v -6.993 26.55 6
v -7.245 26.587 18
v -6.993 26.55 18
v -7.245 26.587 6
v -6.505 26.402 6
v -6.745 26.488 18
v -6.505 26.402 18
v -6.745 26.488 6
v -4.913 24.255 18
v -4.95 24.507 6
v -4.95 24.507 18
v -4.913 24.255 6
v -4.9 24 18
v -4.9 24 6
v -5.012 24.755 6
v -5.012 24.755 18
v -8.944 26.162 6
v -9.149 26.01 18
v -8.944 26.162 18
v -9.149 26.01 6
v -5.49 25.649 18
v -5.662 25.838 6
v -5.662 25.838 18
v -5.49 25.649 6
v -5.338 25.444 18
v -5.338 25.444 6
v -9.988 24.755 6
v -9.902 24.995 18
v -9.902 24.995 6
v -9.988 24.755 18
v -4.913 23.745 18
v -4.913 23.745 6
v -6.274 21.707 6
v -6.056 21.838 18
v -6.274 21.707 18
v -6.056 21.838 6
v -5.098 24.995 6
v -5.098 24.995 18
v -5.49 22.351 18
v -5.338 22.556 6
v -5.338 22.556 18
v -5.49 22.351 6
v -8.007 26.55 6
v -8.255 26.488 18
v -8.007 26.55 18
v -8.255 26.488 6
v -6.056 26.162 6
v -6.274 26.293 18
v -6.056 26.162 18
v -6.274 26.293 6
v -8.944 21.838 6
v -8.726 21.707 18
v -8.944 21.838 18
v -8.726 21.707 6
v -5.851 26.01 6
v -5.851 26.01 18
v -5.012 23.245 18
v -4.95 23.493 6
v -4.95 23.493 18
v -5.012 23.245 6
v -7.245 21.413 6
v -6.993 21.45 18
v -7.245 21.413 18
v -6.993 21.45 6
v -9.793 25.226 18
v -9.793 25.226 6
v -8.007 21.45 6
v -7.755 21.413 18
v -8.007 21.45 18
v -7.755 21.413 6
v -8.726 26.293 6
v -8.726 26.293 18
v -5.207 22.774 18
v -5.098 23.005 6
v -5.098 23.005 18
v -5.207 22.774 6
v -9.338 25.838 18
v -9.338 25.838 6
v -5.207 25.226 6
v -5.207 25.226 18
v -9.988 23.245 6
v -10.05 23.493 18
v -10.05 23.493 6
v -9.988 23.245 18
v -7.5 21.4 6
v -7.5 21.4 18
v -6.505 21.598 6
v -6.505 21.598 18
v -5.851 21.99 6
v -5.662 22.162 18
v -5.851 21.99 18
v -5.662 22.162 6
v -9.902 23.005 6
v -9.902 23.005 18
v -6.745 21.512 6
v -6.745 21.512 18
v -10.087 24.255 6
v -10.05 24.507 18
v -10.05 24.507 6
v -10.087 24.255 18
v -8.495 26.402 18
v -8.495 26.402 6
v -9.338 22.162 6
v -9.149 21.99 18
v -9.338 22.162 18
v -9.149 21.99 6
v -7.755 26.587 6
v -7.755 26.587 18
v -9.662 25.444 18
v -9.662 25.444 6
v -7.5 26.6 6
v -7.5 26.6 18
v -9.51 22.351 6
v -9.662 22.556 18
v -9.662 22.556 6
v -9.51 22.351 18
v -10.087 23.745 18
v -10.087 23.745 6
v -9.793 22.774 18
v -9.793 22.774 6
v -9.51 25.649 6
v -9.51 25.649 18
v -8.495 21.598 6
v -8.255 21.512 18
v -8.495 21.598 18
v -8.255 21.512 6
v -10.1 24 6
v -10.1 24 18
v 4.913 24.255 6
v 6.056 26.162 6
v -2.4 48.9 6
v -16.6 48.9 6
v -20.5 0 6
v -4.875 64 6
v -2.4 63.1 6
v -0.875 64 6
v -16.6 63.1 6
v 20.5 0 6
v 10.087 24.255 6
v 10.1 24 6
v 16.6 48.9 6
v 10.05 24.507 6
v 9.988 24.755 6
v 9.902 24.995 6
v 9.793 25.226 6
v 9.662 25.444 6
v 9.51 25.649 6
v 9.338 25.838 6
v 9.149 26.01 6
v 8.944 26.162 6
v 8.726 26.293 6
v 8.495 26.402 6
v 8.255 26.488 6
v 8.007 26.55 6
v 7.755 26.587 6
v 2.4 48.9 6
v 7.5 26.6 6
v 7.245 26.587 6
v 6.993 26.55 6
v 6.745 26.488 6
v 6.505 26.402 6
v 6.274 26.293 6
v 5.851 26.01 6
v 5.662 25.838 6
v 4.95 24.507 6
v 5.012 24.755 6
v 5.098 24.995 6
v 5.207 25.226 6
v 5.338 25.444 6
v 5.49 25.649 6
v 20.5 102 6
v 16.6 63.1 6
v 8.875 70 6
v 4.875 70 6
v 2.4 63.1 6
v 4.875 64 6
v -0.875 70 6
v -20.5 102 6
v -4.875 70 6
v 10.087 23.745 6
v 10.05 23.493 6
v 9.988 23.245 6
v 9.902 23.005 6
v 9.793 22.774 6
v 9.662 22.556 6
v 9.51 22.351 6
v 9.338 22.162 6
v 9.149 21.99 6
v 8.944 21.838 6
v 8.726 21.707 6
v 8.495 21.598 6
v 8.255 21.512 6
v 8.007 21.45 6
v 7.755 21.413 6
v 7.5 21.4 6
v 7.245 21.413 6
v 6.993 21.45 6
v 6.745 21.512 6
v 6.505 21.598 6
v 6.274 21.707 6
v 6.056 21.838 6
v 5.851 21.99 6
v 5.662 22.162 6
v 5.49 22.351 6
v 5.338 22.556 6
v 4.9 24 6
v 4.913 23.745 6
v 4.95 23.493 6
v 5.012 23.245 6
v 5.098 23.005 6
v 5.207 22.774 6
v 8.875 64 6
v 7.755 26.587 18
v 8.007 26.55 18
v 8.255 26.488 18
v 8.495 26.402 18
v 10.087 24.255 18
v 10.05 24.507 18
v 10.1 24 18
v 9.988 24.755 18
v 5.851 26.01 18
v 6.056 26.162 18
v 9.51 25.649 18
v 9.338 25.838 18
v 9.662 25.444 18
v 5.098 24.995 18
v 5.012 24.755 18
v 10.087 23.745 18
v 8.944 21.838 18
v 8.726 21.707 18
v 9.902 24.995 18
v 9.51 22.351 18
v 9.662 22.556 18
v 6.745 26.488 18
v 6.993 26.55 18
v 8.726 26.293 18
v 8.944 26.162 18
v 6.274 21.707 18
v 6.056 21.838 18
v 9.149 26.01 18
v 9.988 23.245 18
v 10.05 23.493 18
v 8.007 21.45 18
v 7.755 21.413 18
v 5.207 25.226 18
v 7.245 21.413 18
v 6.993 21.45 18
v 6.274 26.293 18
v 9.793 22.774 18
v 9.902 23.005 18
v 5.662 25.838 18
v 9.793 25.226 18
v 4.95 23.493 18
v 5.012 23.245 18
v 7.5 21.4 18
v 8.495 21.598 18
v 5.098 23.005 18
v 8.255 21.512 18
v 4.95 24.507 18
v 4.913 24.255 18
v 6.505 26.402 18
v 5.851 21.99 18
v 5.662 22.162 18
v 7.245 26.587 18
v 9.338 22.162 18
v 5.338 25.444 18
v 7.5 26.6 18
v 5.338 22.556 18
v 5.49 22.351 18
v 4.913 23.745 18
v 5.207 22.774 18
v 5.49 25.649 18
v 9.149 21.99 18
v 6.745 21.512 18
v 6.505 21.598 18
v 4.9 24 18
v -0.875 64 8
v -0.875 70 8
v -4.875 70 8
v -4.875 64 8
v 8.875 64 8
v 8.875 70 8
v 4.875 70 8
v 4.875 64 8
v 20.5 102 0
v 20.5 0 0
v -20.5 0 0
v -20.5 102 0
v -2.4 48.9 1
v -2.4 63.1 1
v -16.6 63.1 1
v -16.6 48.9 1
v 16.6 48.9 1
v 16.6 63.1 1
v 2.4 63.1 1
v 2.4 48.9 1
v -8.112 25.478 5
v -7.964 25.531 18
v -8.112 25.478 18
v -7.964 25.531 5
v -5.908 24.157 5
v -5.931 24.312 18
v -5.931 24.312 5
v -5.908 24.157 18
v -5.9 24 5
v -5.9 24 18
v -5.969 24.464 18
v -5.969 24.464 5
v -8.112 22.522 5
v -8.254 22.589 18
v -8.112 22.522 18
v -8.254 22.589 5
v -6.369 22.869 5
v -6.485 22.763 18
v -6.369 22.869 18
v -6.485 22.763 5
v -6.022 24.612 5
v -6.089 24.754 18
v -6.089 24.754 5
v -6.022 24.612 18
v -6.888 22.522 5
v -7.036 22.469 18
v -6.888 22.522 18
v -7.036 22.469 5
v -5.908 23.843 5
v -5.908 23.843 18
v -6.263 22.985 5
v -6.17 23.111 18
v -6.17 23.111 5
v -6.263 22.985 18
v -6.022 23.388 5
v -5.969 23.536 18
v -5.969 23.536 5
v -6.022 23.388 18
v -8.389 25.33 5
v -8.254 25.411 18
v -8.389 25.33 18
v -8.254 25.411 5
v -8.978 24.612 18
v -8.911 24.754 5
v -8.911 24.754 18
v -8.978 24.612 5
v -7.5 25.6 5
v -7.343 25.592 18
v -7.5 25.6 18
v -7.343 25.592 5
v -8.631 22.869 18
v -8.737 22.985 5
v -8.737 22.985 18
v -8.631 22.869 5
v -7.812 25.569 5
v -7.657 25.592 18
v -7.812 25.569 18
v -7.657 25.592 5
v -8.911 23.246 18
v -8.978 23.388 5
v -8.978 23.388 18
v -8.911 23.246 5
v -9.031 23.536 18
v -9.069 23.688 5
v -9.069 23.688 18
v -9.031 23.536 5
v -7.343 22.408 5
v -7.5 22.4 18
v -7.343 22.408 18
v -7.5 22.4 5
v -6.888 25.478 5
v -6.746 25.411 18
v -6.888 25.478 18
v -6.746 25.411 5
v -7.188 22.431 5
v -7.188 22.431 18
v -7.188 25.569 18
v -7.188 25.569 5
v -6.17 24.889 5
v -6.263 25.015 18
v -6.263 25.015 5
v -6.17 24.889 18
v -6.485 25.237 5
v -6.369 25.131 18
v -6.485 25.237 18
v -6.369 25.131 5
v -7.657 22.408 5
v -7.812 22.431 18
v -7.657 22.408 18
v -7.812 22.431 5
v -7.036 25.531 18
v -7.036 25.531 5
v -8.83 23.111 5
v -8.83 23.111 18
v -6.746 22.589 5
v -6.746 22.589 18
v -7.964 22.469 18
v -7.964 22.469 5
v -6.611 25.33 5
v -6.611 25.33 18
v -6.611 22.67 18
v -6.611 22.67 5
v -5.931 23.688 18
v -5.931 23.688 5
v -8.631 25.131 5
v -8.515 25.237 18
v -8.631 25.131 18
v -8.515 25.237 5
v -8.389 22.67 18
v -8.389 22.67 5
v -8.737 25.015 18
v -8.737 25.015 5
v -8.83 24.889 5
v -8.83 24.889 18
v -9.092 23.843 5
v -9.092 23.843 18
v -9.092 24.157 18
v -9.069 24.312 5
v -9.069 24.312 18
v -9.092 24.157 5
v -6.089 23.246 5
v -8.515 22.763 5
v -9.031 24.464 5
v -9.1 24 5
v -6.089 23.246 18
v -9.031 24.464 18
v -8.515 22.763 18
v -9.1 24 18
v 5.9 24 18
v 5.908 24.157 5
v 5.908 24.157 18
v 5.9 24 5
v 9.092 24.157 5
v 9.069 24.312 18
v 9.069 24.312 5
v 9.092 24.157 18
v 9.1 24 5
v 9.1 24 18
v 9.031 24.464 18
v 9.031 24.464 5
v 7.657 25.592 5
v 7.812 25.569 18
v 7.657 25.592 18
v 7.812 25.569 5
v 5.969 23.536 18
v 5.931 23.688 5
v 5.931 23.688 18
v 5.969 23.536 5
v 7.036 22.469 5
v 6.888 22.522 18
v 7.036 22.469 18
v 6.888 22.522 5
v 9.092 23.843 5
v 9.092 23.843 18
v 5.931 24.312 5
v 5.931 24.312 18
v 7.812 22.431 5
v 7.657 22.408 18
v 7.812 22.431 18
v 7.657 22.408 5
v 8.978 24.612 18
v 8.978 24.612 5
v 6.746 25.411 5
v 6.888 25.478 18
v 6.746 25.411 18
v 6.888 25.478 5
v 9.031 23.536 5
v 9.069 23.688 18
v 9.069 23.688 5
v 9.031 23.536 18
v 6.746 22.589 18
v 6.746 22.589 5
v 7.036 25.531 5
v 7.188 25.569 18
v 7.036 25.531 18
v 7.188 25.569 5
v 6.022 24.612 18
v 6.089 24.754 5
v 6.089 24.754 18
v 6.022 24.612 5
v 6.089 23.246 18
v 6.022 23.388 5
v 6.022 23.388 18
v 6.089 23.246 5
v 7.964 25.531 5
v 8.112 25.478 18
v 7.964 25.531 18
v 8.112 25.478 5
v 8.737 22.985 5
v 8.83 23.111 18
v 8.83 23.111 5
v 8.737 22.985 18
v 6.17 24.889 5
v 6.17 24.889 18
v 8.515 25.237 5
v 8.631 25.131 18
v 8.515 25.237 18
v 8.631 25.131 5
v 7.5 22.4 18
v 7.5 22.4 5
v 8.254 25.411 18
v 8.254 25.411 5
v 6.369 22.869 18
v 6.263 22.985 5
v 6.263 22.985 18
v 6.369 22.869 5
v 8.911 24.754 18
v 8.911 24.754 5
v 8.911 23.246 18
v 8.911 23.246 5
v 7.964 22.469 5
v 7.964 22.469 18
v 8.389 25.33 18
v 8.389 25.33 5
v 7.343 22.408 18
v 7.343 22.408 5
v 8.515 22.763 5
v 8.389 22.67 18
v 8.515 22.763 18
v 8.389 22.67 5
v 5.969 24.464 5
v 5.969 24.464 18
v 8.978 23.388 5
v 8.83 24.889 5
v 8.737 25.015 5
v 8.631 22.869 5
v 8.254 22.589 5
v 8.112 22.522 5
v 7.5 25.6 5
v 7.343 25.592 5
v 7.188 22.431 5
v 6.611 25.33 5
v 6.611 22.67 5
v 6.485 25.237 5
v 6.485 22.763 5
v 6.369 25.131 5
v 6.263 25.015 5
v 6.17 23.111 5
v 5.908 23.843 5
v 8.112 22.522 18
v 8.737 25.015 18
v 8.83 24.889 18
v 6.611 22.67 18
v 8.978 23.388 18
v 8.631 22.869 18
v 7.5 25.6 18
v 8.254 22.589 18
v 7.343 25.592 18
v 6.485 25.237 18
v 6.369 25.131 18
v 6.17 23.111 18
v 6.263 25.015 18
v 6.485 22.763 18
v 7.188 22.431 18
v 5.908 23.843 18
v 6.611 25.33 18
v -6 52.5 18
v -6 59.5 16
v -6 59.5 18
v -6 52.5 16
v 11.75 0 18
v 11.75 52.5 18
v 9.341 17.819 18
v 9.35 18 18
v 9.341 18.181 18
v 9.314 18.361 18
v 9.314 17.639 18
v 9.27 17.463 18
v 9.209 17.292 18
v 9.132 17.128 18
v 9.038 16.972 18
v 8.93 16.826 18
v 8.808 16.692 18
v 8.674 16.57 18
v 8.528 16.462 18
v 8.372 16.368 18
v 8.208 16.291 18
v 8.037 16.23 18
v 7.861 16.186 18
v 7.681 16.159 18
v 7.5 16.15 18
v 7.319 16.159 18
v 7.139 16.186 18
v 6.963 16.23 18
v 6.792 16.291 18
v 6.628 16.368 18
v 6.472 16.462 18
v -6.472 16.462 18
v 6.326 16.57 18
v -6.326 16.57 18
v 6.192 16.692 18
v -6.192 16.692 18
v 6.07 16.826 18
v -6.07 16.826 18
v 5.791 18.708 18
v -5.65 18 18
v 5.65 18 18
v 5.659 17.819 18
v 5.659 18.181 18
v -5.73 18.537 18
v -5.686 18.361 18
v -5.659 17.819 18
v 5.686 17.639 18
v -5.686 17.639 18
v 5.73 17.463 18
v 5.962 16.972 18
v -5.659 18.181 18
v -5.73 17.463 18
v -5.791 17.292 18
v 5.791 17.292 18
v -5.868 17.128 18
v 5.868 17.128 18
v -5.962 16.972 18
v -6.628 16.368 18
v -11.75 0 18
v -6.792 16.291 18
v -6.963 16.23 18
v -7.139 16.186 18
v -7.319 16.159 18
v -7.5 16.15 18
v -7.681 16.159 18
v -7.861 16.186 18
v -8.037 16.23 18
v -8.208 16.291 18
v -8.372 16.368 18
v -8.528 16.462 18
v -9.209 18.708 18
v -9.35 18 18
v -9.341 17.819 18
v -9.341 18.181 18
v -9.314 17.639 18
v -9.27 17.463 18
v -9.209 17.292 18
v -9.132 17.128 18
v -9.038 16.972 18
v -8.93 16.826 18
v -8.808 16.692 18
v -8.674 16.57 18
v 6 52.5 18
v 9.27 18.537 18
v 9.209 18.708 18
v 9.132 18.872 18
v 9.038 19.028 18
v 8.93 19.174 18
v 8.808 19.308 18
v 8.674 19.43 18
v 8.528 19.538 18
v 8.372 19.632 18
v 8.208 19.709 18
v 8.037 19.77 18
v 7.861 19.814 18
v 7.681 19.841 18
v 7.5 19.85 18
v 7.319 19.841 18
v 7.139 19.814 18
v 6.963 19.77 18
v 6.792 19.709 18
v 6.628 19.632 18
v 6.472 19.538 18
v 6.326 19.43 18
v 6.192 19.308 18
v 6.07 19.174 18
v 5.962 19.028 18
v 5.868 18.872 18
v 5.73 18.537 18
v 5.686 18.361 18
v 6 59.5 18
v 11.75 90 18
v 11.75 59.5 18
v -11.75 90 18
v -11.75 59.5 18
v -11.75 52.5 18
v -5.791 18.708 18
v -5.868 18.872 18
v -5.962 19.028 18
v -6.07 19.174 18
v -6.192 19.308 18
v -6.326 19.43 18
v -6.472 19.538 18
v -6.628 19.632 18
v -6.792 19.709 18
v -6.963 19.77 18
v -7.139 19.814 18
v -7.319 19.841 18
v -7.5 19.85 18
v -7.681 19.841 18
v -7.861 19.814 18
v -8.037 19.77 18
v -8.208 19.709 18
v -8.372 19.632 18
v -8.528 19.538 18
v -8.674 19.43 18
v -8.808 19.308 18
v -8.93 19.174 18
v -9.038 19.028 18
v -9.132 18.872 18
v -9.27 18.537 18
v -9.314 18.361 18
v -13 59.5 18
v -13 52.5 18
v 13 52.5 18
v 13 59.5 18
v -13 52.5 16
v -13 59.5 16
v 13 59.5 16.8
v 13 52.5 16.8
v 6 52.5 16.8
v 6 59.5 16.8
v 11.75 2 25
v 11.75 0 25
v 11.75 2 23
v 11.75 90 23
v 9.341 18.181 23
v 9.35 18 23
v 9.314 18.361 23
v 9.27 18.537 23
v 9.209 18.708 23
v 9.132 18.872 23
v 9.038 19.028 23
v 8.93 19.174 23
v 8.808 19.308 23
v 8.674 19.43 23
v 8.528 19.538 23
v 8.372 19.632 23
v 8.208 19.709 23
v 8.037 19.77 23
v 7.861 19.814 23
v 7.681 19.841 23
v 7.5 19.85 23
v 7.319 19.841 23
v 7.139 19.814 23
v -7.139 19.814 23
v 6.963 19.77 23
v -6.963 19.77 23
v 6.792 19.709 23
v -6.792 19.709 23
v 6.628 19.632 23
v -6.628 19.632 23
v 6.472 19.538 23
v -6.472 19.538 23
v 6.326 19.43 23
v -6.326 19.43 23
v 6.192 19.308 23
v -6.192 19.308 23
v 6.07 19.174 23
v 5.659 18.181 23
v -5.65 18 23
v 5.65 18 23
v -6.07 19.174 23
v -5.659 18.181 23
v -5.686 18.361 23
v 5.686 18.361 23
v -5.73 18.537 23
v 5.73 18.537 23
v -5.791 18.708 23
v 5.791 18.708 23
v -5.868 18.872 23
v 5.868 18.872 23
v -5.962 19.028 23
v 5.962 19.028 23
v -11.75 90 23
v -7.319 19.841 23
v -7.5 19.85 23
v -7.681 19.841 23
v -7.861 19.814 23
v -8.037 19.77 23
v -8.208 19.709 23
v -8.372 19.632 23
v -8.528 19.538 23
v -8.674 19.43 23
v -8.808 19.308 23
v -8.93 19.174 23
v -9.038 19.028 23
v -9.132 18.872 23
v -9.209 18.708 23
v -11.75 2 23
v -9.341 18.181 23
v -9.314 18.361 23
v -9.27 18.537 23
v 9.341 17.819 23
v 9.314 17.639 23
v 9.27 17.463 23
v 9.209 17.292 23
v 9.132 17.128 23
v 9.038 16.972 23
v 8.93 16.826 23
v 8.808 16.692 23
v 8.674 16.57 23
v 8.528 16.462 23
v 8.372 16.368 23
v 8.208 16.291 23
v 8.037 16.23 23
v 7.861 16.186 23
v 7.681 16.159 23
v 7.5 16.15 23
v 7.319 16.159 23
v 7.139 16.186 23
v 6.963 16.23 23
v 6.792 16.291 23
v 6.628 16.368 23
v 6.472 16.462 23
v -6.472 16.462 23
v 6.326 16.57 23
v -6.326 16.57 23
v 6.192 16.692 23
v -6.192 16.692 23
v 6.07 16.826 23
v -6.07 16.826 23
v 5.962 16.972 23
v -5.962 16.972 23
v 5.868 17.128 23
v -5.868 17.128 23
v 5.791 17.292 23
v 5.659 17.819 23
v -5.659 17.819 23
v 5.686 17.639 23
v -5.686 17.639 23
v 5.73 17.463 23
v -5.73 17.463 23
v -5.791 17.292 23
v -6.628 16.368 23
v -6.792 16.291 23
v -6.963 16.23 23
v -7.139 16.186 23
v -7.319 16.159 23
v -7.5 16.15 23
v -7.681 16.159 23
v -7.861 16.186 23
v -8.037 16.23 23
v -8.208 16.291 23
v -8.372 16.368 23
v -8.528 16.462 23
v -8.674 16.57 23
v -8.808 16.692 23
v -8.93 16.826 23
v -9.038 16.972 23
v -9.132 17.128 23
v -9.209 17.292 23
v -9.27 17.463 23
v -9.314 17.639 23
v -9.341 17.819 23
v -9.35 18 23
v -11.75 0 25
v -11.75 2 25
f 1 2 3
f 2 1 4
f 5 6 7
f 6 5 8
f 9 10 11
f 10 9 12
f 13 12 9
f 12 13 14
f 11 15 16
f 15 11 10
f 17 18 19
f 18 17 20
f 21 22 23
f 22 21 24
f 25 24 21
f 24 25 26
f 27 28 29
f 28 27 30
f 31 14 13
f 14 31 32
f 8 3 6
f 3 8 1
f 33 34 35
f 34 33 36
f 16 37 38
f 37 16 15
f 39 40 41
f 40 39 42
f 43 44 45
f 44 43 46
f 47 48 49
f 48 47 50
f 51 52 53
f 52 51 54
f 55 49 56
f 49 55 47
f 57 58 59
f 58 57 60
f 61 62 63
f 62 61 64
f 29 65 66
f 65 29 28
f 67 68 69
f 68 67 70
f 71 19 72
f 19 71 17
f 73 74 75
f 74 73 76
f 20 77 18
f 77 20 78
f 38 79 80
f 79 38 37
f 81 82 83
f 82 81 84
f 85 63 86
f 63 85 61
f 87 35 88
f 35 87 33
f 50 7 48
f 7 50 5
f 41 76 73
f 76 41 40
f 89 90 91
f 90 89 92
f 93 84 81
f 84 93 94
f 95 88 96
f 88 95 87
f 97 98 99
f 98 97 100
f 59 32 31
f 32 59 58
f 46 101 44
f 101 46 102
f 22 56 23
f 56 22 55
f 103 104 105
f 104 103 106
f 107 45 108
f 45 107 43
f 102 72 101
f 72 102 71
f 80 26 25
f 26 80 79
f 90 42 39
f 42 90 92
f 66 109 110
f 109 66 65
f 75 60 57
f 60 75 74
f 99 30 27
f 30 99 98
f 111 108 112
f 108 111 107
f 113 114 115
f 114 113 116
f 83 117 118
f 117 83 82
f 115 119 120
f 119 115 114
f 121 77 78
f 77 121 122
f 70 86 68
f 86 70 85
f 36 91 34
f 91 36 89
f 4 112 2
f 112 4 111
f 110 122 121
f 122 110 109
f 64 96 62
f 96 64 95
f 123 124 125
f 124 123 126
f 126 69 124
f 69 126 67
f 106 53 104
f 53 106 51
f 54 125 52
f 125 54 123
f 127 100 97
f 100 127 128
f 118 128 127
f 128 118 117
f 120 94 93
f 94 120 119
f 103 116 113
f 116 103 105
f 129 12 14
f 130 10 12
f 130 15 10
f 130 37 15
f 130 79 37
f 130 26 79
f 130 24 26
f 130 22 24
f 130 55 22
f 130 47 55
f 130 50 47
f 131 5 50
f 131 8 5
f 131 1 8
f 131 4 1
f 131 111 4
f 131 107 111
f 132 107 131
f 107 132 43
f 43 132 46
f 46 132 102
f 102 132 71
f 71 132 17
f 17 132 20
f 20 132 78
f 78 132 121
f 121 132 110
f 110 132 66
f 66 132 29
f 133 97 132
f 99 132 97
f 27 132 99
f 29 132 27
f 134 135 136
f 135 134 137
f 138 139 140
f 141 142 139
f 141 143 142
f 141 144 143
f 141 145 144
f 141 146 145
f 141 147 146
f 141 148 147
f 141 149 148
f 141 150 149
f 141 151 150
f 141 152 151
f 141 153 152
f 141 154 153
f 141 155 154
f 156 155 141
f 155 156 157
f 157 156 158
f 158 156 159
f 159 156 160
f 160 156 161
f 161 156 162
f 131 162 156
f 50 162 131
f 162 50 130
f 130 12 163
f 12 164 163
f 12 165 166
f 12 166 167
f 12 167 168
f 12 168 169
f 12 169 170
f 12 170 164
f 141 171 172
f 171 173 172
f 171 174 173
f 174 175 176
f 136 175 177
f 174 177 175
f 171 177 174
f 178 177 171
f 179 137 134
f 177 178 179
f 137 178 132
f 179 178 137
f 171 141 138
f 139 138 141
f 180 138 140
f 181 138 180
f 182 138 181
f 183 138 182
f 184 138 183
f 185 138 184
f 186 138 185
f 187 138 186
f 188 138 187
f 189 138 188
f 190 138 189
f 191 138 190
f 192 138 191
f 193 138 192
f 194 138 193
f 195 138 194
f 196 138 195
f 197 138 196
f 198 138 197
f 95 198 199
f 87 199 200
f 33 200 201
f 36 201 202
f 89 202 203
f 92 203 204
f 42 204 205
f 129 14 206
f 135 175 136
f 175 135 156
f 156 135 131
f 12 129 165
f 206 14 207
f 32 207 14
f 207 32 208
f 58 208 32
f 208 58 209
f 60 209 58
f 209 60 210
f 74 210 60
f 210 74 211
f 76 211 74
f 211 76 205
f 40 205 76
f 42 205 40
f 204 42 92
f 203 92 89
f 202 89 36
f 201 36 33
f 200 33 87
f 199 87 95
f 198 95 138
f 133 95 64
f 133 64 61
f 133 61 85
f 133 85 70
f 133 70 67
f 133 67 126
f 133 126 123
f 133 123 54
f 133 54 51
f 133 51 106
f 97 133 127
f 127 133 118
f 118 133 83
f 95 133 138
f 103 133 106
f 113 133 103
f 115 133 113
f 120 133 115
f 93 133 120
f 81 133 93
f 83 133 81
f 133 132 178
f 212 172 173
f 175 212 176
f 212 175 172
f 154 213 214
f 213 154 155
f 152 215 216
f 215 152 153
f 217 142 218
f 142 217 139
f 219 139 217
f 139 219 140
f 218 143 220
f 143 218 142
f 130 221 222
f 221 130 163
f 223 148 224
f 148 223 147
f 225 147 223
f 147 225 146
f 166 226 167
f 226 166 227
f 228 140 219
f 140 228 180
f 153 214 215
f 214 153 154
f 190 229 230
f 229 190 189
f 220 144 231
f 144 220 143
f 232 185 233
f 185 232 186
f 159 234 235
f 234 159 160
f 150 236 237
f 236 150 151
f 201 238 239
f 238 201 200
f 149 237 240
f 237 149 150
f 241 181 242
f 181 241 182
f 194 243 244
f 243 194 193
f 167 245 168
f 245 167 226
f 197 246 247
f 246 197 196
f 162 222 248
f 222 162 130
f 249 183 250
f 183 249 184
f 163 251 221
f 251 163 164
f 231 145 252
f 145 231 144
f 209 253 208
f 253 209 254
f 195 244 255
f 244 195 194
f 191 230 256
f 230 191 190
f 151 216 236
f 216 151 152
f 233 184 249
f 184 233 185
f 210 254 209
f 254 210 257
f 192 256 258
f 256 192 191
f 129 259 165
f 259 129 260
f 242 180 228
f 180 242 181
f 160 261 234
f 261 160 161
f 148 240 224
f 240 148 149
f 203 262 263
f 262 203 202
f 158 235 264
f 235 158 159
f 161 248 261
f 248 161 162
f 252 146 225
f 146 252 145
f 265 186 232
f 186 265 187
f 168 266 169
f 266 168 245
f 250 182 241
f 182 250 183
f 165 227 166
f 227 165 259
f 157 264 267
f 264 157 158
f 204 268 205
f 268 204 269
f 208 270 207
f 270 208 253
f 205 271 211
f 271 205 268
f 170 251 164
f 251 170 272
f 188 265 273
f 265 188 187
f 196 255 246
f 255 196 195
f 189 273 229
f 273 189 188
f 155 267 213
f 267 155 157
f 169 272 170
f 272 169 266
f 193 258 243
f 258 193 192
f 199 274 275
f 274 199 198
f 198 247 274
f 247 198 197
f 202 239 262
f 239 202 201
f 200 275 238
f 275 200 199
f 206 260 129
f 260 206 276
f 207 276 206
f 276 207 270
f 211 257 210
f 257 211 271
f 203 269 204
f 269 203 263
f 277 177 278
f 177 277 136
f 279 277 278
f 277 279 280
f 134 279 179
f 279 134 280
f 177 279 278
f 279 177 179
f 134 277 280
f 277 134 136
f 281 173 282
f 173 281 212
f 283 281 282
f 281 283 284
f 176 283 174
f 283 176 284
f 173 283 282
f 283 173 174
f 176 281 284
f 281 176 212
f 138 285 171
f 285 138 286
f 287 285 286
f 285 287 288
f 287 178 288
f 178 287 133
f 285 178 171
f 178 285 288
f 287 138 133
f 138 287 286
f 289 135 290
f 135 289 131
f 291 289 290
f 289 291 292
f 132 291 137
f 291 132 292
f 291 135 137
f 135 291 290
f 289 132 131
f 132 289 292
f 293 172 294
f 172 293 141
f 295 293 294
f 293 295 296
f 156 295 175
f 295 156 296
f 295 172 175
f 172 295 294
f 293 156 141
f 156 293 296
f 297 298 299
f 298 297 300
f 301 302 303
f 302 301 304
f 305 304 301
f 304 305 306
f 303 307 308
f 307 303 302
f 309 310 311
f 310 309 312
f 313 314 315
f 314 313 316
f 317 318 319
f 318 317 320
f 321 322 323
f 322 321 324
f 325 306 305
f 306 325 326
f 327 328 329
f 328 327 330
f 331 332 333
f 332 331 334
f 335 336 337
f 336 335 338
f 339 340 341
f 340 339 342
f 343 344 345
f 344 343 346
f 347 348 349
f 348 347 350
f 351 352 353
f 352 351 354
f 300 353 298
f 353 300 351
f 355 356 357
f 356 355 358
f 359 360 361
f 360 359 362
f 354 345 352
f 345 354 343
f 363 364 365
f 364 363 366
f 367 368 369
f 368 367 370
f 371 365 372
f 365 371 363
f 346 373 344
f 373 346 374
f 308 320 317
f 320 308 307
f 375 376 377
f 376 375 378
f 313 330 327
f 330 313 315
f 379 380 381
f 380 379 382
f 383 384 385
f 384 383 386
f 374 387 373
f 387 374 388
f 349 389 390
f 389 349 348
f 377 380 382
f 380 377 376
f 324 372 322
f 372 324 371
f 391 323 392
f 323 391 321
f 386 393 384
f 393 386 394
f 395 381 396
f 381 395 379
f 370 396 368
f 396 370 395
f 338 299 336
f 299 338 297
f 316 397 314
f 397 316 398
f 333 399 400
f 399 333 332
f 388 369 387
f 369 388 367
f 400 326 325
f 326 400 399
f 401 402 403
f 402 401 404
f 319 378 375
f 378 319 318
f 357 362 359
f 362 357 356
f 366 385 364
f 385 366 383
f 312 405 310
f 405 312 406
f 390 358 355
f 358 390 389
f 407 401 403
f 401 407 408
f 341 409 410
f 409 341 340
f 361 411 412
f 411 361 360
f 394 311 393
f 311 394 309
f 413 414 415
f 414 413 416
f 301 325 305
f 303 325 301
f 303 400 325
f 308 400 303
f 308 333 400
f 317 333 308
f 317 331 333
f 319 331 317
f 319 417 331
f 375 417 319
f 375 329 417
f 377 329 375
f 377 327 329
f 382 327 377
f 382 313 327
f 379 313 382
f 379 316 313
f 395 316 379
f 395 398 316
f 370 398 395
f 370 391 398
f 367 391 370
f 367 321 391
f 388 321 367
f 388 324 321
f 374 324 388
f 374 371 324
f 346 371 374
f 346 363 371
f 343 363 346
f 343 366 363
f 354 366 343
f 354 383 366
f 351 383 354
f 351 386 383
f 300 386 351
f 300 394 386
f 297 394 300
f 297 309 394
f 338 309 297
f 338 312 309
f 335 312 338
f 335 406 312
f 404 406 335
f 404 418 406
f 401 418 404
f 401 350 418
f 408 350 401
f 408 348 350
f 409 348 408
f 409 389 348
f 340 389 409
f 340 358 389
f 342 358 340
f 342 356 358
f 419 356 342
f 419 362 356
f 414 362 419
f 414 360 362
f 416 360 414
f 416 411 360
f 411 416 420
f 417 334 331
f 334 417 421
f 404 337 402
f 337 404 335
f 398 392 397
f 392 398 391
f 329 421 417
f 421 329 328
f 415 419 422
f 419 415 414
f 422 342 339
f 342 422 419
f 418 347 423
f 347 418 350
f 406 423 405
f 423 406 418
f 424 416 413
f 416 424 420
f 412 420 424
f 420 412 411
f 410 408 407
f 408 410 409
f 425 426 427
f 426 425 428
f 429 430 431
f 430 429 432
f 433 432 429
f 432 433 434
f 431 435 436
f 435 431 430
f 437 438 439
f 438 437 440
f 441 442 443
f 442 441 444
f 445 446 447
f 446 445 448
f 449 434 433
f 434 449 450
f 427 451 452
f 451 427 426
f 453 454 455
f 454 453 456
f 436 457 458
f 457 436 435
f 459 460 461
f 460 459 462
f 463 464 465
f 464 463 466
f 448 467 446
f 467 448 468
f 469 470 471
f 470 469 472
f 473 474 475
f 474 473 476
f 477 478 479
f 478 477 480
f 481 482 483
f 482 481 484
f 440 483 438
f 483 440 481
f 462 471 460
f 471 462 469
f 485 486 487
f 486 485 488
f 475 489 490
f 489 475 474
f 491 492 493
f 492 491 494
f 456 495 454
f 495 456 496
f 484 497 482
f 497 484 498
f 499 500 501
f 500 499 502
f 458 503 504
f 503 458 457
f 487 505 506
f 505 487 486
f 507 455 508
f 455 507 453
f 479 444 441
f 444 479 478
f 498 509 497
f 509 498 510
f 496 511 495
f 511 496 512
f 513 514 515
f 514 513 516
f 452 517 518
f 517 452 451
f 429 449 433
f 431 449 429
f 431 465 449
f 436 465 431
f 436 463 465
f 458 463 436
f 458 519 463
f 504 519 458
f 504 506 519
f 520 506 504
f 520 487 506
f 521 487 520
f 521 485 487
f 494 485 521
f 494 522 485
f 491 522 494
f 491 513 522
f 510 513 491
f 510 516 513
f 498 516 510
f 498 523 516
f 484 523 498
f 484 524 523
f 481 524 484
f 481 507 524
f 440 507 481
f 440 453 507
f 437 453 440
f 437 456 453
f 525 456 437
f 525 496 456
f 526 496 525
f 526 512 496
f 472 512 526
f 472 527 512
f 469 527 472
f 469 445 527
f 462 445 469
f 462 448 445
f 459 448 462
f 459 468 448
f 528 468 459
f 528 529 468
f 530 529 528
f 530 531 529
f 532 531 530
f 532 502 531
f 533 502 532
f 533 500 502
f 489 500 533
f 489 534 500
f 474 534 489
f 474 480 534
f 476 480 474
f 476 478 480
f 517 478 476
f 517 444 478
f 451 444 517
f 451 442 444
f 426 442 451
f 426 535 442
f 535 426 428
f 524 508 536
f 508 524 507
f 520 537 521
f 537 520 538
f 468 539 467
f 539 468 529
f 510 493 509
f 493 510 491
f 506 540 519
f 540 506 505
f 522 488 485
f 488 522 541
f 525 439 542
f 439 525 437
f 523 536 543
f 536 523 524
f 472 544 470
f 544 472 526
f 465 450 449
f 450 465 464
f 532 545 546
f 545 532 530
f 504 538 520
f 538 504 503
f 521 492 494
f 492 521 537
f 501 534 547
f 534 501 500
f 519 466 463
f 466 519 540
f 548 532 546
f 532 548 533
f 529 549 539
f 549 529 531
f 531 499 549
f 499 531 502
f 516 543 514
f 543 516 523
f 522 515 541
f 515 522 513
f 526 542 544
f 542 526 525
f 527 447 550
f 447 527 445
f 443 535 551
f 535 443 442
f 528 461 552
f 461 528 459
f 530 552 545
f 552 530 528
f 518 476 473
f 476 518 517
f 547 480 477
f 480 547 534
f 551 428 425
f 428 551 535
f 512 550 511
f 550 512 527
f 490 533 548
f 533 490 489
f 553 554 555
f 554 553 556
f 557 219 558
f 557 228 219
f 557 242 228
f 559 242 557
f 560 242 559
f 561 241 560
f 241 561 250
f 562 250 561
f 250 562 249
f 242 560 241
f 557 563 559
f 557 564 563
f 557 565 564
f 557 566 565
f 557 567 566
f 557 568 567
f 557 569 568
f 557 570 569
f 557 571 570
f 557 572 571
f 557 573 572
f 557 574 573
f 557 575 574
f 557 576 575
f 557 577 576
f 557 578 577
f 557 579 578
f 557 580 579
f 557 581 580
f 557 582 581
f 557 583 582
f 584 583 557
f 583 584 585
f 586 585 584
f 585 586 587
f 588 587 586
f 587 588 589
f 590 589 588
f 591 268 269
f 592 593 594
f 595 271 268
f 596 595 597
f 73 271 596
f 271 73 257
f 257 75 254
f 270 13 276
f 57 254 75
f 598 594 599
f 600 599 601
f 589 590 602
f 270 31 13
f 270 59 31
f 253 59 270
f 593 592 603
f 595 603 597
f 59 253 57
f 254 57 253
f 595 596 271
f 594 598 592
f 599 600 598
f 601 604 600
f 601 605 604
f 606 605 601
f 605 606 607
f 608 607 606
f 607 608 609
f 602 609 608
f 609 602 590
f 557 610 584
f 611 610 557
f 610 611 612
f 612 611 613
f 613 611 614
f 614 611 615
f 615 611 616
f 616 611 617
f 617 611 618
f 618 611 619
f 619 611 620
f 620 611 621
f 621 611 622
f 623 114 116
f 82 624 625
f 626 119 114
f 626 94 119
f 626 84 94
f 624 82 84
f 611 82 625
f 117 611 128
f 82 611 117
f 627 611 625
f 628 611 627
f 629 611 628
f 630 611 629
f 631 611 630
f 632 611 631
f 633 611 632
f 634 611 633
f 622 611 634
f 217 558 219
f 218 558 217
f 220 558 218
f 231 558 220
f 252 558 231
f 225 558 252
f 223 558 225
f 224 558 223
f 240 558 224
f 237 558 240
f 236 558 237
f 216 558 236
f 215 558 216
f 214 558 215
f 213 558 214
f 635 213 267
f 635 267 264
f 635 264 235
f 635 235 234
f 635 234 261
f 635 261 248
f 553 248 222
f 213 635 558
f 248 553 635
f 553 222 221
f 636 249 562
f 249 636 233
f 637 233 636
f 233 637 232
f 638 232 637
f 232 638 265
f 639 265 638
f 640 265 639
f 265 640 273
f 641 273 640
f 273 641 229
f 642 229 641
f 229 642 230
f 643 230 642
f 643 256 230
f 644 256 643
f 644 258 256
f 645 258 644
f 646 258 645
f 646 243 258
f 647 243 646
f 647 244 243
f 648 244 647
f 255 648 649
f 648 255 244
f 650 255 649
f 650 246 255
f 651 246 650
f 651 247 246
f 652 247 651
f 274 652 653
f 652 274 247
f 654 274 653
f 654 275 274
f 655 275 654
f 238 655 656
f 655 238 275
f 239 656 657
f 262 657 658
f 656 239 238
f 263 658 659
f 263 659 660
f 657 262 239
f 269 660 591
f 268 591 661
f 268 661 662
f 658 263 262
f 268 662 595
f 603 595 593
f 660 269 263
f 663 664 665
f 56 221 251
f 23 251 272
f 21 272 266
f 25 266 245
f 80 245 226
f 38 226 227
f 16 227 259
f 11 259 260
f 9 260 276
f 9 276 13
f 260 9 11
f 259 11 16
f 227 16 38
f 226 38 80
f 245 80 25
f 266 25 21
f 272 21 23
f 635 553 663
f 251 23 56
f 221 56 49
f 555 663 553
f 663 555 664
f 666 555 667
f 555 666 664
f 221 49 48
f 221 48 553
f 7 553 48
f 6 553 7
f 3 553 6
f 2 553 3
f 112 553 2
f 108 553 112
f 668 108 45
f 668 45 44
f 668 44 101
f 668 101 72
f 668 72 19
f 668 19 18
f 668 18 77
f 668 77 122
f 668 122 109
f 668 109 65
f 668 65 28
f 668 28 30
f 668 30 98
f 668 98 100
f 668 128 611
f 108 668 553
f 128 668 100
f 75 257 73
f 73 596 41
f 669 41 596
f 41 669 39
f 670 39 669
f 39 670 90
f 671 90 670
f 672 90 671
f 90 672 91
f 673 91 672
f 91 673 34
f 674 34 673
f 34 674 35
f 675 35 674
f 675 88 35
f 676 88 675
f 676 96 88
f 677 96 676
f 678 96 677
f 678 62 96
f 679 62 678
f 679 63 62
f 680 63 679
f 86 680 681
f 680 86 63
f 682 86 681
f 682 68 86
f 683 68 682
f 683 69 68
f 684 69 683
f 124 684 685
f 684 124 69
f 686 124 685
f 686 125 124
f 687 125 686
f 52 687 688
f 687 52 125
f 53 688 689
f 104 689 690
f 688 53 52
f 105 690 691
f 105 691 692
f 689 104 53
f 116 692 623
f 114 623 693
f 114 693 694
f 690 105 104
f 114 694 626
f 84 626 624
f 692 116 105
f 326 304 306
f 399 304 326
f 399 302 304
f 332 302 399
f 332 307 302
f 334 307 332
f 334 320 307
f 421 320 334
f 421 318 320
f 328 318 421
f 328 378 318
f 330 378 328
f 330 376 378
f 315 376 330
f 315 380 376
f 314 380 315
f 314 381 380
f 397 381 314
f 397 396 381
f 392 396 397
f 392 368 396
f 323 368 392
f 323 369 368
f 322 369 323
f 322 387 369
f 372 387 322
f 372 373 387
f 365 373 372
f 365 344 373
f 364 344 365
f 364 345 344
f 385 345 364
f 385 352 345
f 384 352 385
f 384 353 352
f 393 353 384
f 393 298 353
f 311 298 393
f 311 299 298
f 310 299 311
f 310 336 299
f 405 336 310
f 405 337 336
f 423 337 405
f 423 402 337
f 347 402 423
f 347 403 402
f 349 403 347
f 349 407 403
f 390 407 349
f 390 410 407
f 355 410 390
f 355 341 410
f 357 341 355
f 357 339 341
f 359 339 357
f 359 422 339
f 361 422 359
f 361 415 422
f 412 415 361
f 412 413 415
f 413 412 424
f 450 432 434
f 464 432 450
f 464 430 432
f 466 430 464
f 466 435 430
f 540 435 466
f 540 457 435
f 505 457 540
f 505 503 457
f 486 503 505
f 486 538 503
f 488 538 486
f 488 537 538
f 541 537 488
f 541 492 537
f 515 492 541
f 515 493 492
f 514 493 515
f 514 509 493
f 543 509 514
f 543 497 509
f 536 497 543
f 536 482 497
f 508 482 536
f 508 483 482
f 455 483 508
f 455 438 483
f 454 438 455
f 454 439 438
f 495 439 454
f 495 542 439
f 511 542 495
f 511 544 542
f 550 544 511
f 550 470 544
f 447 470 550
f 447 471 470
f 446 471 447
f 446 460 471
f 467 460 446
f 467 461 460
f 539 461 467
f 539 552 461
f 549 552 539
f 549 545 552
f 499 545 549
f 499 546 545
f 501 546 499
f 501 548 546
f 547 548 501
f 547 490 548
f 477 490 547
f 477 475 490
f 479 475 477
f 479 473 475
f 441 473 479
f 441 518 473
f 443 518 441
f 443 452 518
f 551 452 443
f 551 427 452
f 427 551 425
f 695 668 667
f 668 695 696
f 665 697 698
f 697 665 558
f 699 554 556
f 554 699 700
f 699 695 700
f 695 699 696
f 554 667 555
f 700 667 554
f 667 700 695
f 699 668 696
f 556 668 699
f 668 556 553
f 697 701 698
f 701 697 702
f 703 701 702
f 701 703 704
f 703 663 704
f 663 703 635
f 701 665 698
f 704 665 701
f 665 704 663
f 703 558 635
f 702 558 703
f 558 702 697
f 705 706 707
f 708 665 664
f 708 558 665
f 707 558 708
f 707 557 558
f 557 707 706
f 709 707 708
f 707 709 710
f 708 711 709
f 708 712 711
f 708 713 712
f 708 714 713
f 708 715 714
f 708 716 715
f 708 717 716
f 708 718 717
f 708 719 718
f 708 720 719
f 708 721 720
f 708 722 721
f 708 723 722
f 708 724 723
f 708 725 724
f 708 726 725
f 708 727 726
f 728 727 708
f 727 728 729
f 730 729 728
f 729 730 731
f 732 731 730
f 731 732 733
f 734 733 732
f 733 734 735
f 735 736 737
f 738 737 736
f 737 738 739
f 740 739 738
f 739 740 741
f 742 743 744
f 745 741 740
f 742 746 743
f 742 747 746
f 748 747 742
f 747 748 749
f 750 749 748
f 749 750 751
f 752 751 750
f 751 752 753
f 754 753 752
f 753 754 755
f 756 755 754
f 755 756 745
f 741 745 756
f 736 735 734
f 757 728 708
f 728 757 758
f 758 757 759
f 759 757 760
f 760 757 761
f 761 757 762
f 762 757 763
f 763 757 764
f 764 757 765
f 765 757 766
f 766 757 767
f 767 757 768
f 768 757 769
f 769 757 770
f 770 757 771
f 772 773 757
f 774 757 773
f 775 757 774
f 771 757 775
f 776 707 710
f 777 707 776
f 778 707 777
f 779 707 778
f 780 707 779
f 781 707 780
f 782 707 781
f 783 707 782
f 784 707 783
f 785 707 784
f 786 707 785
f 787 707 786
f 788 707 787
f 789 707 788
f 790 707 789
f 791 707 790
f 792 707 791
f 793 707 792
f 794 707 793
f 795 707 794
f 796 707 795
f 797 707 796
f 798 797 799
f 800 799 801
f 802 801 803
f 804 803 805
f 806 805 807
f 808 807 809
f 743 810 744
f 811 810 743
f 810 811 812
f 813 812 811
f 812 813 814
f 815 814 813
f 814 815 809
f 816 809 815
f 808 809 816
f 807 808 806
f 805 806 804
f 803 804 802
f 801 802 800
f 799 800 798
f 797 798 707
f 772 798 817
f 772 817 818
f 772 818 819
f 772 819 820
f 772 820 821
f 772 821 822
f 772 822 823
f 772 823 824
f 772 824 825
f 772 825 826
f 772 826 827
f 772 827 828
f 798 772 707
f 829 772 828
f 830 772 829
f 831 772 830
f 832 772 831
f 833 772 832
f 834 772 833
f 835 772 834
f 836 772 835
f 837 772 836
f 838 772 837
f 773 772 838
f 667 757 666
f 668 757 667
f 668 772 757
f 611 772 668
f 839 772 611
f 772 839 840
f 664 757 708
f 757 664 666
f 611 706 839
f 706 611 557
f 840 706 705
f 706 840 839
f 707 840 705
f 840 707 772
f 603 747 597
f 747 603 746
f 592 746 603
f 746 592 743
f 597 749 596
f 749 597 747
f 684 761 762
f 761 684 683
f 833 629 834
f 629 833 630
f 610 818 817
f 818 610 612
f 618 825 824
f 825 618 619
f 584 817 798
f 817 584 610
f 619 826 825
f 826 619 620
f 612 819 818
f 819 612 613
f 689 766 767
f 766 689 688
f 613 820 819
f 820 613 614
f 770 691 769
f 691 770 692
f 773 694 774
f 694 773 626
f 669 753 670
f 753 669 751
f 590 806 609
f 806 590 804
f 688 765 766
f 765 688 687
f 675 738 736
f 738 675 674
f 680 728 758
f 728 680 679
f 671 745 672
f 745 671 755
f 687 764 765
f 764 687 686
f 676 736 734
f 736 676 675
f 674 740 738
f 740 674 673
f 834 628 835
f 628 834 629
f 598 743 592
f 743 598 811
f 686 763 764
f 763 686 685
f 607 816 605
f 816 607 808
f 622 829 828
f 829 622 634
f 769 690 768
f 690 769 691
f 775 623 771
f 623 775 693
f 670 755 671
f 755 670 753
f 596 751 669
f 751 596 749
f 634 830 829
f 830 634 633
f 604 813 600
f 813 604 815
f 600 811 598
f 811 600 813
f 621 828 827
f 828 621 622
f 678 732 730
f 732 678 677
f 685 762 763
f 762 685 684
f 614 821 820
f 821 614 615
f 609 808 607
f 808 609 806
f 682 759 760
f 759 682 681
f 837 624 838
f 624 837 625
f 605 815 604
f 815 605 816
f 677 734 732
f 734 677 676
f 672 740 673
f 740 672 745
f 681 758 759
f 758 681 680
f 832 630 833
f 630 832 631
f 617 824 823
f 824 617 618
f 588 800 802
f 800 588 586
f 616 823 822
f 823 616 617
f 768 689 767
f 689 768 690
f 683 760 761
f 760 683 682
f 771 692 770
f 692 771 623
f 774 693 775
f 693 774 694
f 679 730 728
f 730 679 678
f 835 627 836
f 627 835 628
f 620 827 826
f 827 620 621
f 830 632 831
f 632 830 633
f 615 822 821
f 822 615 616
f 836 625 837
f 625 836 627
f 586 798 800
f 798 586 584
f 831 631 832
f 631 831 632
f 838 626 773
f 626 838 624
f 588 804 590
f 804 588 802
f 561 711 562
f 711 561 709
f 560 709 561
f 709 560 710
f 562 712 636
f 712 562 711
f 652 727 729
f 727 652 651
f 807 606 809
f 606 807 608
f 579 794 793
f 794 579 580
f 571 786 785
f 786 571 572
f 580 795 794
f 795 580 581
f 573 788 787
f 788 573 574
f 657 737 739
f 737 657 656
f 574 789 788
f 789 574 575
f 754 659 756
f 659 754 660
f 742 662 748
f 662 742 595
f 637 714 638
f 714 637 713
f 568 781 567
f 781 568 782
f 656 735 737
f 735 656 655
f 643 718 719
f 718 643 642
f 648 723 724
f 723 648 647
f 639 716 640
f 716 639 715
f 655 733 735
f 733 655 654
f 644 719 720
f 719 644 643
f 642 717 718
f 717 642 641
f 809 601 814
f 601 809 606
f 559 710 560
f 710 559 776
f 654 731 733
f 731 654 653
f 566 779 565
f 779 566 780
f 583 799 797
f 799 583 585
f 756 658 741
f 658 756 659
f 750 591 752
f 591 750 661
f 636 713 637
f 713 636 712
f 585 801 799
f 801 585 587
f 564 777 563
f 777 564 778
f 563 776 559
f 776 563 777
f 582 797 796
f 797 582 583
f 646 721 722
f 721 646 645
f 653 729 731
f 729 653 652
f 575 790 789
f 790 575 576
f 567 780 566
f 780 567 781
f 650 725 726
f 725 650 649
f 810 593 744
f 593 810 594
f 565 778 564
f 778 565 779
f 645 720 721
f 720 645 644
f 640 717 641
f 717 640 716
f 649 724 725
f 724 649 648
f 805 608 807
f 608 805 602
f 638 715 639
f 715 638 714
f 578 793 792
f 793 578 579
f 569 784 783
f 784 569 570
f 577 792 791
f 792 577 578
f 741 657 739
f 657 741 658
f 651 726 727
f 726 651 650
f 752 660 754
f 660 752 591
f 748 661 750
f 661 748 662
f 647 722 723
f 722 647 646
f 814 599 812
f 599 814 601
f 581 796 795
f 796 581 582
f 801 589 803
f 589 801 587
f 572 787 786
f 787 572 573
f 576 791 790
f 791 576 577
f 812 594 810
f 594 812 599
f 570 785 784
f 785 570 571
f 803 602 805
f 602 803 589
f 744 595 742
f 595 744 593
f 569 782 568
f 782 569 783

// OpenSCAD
/*
  1-key MVP: короткая “синт-клавиша” + 2 MX-свитча под ней + ступенька (A раньше, B позже)
  OpenSCAD: две детали
    - key()  : сама клавиша с направляющими отверстиями и двумя pads разной высоты
    - base() : основание с двумя стойками-направляющими (на M3) и карманами под MX

  Единицы: мм
  Советы:
   - Для прототипа печатай KEY и BASE отдельно.
   - KEY лучше печатать “верхом вверх” (плоской стороной на стол).
   - В BASE стойки лучше печатать вместе с основанием (или как отдельные детали).
   source: https://chatgpt.com/c/696551ba-1840-8330-857e-2754e7f56b41
*/

$fn = 64;

// -------------------- Параметры --------------------
show_key  = true;
show_base = true;
explode   = 12;  // разнос деталей для просмотра

// KEY (клавиша)
key_len = 90;
key_w   = 23.5;
key_t   = 5;

travel = 4.2;              // общий ход клавиши вниз (задаётся механикой упора)
pad_size = 7.0;            // квадратный "пятачок" под нажим на шток свитча
padA_h  = 2.0;             // высота A-pad
pad_delta = 0.8;           // B позже => B-pad ниже на pad_delta
padB_h  = padA_h - pad_delta;

// Направляющие (винты M3 как стойки)
guide_d_nom = 3.0;         // номинал M3
guide_hole_clear = 0.35;   // зазор под скольжение (увеличь до 0.45 если клинит)
guide_hole_d = guide_d_nom + 2*guide_hole_clear;

guide_spacing = 15.0;      // расстояние между направляющими по ширине
guide_from_front = 18.0;   // отступ оси направляющих от переднего края клавиши

// BASE (основание)
base_margin = 6;           // поля вокруг геометрии
base_t = 6;

// Стойки-направляющие (под винты M3)
post_d = 5.2;              // диаметр стойки (достаточно толстая для жёсткости)
post_h = key_t + travel + 4;   // высота стойки
post_hole_d = 3.2;         // отверстие под винт M3 (если хочешь винт насквозь)
post_hole = true;          // делать отверстие под винт в стойках?

// MX карманы (упрощённо, без "plate cutout" под защёлки)
mx_body_w = 14.2;          // квадрат под корпус MX (чуть с зазором)
mx_body_h = 14.2;
mx_pocket_depth = 5.0;     // глубина кармана
mx_center_spacing = 19.0;  // расстояние между центрами двух свитчей (подгони под свой корпус)

// Позиции свитчей относительно BASE (центр)
mx_y = base_margin + guide_from_front + 32;  // смещение назад: чтобы pads были ближе к центру клавиши
// ^ Можно подгонять: чем дальше назад, тем меньше "перекос" при нажатии пальцем спереди.

// -------------------- Сборка для превью --------------------
if (show_base) base();

if (show_key) translate([0,0, base_t + explode]) key();

// -------------------- Деталь: KEY --------------------
module key(){
  difference(){
    union(){
      // Основная пластина
      translate([-key_w/2, 0, 0])
        cube([key_w, key_len, key_t], center=false);

      // A-pad и B-pad снизу (разной высоты)
      // Размещаем pads над центрами MX-свитчей.
      // Их Y-координаты должны совпасть с mx_y в base().
      for (i=[-0.5, 0.5]){
        // A-pad слева (i=-0.5), B-pad справа (i=0.5)
        pad_h = (i < 0) ? padA_h : padB_h;

        translate([i*mx_center_spacing - pad_size/2, mx_y - pad_size/2, -pad_h])
          cube([pad_size, pad_size, pad_h], center=false);
      }

      // Небольшой "бортик" спереди (опционально, чтобы палец не соскальзывал)
      translate([-key_w/2, 0, key_t])
        cube([key_w, 2.0, 2.0], center=false);
    }

    // Отверстия под направляющие (сквозь клавишу)
    for (i=[-0.5, 0.5]){
      translate([i*guide_spacing, guide_from_front, -1])
        cylinder(d=guide_hole_d, h=key_t+2);
    }
  }
}

// -------------------- Деталь: BASE --------------------
module base(){
  // Размер основания по длине под KEY и механику
  base_len = key_len + base_margin*2;
  base_w   = max(key_w + base_margin*2, mx_center_spacing + base_margin*2 + 10);

  difference(){
    union(){
      // Плита основания
      translate([-base_w/2, 0, 0])
        cube([base_w, base_len, base_t], center=false);

      // Стойки-направляющие
      for (i=[-0.5, 0.5]){
        translate([i*guide_spacing, base_margin + guide_from_front, base_t])
          cylinder(d=post_d, h=post_h);
      }

      // Простые "стопы" (упоры) сверху основания, чтобы ограничить ход клавиши (опционально)
      // Идея: клавиша упирается не в свитчи, а в эти стопы/демпфер.
      // На прототипе можно просто наклеить TPU/силикон на эти зоны.
      stop_w = 4;
      stop_h = 2;
      stop_y = mx_y + 8; // чуть позади свитчей
      for (i=[-0.5, 0.5]){
        translate([i*(key_w/2 - stop_w/2), stop_y, base_t])
          cube([stop_w, 6, stop_h], center=false);
      }
    }

    // Карманы под два MX-свитча (упрощённые)
    for (i=[-0.5, 0.5]){
      translate([i*mx_center_spacing - mx_body_w/2, mx_y - mx_body_h/2, base_t - mx_pocket_depth])
        cube([mx_body_w, mx_body_h, mx_pocket_depth+0.2], center=false);
    }

    // Отверстия под стойки (если хочешь винт M3)
    if (post_hole){
      for (i=[-0.5, 0.5]){
        translate([i*guide_spacing, base_margin + guide_from_front, base_t - 1])
          cylinder(d=post_hole_d, h=post_h + base_t + 2);
      }
    }
  }

  // Визуализация мест свитчей (не вырез, просто подсказка)
  //comment_switches();
}

// Подсказка (не используется): отрисовать "макеты" свитчей
module comment_switches(){
  color("gray", 0.3)
  for (i=[-0.5, 0.5]){
    translate([i*mx_center_spacing, mx_y, base_t])
      cube([14,14,10], center=true);
  }
}
